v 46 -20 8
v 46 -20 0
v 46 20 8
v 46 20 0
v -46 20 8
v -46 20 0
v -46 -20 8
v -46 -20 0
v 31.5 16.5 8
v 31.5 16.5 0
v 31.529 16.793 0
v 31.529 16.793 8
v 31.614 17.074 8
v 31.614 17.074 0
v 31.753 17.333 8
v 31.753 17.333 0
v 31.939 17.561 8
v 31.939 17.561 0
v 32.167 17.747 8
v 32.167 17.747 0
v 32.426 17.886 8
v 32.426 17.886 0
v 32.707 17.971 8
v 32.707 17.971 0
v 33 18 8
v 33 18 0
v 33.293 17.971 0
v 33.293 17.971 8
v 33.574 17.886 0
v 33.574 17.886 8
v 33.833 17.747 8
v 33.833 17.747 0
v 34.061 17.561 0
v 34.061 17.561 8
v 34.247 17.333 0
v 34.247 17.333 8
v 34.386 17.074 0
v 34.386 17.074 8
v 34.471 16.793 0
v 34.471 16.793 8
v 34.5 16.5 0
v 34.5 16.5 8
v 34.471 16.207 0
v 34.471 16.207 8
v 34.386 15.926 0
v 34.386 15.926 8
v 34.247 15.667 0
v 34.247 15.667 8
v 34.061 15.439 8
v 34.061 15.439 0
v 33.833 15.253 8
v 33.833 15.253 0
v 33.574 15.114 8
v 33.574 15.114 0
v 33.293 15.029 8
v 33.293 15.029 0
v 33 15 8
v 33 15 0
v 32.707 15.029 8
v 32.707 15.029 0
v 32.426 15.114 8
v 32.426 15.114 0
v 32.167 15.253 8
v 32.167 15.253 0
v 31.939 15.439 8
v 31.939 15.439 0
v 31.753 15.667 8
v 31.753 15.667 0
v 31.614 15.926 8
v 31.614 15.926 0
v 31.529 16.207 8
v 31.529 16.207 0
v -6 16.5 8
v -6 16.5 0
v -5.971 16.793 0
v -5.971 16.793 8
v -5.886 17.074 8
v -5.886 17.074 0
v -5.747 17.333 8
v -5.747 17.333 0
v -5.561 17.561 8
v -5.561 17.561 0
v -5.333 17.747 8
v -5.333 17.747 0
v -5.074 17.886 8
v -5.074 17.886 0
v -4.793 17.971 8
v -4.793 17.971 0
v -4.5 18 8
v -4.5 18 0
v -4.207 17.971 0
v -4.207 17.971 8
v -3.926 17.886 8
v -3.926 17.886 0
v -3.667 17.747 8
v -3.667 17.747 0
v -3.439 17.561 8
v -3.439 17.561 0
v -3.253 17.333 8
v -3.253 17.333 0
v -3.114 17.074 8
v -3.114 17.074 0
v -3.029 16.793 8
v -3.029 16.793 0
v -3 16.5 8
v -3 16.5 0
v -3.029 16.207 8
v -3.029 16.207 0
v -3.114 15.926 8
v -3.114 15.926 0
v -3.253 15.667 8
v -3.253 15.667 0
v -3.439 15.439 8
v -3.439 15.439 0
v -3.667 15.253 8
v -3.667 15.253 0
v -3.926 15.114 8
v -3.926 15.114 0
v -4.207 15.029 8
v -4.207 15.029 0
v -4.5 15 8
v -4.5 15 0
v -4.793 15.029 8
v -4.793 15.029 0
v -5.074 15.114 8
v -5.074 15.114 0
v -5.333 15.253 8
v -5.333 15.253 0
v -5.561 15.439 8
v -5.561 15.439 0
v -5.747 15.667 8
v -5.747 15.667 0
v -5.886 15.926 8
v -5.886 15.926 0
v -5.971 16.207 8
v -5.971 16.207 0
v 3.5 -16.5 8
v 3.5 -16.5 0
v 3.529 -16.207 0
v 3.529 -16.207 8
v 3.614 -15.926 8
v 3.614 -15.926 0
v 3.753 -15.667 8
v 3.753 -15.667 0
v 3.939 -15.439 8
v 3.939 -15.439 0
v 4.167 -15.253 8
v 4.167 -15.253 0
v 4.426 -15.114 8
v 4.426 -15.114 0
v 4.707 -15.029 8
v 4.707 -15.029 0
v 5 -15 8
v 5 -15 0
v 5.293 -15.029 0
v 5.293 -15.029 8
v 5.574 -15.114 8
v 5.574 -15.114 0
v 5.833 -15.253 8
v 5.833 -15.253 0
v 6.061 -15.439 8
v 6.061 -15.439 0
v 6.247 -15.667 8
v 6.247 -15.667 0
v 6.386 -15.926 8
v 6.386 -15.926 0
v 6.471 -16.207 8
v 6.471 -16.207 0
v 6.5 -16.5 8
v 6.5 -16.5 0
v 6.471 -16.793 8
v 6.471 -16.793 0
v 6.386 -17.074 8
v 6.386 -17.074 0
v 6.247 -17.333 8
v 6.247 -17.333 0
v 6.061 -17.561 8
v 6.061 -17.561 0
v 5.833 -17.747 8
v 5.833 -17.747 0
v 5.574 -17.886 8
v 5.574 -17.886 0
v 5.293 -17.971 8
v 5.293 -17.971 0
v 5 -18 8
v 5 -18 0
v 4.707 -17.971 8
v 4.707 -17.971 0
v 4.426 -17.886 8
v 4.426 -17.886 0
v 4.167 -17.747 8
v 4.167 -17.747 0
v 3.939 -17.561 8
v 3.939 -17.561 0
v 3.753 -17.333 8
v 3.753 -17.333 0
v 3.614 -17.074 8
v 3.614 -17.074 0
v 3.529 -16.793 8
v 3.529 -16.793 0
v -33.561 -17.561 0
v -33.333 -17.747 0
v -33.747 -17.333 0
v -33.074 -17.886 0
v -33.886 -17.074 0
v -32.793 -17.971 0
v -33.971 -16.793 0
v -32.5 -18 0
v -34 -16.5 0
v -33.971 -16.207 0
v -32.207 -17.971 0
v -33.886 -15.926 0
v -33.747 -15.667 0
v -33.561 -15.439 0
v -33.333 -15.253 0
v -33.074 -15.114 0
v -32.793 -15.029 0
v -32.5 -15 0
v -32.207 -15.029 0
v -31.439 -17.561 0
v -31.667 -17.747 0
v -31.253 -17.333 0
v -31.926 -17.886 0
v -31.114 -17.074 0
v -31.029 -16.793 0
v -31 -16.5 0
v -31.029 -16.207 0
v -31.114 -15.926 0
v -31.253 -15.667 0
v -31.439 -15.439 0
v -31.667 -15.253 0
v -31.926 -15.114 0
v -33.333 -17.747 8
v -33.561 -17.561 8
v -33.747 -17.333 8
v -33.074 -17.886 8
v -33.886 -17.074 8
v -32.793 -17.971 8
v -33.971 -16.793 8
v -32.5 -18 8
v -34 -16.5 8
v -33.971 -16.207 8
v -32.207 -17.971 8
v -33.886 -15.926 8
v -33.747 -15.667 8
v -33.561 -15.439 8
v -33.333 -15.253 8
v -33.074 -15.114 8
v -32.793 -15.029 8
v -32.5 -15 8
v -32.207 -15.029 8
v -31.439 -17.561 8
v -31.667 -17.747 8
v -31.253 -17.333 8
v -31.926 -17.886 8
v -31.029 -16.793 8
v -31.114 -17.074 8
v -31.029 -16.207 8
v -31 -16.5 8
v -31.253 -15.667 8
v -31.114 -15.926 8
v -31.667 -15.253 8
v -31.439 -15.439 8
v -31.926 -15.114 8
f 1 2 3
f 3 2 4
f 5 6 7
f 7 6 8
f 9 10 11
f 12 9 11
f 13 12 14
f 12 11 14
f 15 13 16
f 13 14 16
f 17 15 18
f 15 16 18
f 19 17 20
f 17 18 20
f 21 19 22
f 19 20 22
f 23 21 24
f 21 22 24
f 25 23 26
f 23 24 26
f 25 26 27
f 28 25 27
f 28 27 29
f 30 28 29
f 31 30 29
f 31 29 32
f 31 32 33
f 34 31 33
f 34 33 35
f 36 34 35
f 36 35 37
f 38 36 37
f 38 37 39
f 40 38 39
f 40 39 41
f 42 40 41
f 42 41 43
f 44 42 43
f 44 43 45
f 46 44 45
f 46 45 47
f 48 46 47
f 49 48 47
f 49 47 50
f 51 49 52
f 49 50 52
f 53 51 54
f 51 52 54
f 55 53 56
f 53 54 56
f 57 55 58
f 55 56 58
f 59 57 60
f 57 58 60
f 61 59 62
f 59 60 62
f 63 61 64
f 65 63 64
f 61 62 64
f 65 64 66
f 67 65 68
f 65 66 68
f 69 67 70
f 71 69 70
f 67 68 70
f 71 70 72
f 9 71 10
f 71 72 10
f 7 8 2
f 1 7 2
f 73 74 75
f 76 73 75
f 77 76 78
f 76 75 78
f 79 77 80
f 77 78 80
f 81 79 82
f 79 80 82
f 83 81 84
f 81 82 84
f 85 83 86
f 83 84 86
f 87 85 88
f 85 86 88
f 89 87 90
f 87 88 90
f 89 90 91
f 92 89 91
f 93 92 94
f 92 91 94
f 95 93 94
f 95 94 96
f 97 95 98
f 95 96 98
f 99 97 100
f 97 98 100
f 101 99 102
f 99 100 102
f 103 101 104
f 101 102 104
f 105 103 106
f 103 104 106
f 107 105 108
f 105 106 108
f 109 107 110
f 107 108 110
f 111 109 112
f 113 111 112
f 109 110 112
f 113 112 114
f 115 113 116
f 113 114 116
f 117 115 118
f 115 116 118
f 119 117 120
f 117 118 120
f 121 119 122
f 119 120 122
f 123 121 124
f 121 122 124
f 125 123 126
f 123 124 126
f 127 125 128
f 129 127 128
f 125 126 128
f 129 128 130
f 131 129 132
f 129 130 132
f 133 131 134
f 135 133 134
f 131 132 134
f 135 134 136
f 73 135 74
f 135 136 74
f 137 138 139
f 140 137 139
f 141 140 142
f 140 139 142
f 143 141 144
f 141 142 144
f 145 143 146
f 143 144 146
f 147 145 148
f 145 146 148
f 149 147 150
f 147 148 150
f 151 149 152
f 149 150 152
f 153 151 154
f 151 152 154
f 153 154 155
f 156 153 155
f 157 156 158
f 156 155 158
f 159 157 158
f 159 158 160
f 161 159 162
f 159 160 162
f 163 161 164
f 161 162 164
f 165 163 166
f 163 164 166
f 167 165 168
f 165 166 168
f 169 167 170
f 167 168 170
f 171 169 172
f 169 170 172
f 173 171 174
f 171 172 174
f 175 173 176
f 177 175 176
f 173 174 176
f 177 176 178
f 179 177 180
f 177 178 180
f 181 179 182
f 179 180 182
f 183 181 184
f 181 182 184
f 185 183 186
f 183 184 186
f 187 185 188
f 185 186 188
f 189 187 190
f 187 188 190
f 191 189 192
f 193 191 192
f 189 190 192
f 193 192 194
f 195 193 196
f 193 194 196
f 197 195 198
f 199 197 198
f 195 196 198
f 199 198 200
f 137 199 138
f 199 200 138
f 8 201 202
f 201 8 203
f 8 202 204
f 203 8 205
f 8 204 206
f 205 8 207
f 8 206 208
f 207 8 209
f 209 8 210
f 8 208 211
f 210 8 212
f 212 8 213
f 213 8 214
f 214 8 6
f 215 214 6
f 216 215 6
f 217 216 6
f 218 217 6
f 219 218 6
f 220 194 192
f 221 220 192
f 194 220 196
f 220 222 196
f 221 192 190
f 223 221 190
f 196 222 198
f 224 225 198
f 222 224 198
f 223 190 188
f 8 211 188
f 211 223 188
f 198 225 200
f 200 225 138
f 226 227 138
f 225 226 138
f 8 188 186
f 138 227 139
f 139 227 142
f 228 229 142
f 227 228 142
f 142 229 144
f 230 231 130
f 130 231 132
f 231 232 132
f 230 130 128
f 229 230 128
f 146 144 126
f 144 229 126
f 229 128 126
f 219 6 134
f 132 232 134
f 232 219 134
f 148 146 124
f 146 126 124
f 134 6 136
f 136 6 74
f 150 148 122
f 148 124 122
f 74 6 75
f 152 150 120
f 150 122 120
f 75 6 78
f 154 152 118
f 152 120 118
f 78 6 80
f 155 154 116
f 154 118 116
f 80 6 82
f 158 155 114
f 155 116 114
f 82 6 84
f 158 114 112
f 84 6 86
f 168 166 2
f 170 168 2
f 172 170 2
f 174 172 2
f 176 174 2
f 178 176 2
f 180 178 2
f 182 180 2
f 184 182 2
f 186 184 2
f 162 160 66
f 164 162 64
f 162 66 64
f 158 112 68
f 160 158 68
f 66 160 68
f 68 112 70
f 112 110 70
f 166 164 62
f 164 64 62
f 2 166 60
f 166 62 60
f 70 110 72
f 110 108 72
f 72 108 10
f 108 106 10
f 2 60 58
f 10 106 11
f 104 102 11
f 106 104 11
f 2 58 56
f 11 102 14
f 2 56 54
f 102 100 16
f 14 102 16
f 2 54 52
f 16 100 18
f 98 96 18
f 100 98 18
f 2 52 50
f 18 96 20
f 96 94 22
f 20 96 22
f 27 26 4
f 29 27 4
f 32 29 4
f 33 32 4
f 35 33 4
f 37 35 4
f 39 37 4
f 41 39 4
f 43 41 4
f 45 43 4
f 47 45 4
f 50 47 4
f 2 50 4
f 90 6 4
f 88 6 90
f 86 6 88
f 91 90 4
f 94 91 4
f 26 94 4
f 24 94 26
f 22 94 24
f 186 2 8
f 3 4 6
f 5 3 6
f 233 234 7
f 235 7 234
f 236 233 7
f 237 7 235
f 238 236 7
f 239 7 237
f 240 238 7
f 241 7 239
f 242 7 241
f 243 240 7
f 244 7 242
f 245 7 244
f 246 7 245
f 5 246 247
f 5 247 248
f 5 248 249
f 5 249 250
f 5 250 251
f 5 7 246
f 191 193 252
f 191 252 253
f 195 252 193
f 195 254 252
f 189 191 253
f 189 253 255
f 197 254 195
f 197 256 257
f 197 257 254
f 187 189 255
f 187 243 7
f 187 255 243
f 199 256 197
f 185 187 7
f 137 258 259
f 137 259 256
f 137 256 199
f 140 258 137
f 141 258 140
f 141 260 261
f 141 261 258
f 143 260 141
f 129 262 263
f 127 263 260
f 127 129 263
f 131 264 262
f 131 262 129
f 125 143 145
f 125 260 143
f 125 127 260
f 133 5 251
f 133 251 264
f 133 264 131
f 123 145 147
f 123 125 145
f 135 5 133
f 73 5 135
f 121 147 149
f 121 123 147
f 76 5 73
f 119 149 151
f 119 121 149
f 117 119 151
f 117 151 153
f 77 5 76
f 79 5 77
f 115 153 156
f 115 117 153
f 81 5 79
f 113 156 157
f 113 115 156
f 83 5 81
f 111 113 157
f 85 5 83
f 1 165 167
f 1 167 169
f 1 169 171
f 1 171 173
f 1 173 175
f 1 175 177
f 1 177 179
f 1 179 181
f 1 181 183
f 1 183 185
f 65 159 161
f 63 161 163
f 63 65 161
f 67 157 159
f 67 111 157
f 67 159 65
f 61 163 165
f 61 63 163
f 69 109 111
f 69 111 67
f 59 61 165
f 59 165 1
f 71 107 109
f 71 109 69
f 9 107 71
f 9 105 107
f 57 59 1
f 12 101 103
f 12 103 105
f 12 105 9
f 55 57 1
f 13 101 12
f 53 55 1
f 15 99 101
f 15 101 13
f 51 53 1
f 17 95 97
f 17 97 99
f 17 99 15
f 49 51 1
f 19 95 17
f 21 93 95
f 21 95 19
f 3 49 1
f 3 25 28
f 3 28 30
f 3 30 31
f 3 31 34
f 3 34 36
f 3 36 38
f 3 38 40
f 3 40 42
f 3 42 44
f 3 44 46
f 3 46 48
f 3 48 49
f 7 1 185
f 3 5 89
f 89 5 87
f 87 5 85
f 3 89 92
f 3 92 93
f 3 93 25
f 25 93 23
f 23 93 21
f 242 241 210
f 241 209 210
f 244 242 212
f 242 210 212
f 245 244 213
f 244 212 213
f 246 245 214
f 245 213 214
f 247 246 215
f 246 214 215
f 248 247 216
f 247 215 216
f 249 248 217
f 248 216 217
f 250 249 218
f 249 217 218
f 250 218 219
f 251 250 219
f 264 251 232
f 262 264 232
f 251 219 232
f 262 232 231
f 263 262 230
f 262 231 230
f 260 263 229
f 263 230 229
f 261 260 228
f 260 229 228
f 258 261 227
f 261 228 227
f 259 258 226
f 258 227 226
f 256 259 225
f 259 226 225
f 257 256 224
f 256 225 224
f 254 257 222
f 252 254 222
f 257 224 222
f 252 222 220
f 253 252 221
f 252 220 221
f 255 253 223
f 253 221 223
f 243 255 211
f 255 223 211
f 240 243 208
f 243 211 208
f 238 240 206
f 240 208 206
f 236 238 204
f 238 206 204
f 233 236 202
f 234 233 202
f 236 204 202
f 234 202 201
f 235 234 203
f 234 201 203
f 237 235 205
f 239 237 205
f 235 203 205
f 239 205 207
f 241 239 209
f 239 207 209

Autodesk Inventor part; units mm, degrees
ref_plane "YZ Plane" through (0, 0, 0) normal (1, 0, 0) x (0, 1, 0)
ref_plane "XZ Plane" through (0, 0, 0) normal (0, 1, 0) x (-1, 0, 0)
ref_plane "XY Plane" through (0, 0, 0) normal (0, 0, 1) x (1, 0, 0)
sketch "Sketch1" plane through (0, 0, 0) normal (0, 0, 1) x (1, 0, 0)
  line L0 (0, 0) -> (46, 0)
  line L1 (46, 0) -> (46, 20)
  line L2 (46, 20) -> (0, 20)
  line L3 (0, 20) -> (0, 0)
  line L4 (0, 0) -> (-46, 0)
  line L5 (-46, 0) -> (-46, -20)
  line L6 (-46, -20) -> (0, -20)
  line L7 (0, -20) -> (0, 0)
  line L8 (-46, -20) -> (46, -20)
  line L9 (46, -20) -> (46, 20)
  line L10 (46, 20) -> (-46, 20)
  line L11 (-46, 20) -> (-46, -20)
  point P0 (0, 20)
  point P1 (0, -20)
  dimension "d7" = 40
  dimension "d8" = 92
extrude "Extrusion1" add sketch "Sketch1" along normal blind 8
sketch "Sketch2" plane through (0, 0, 0) normal (0, 0, -1) x (-1, 0, 0)
  circle A0 centre (24, 16) radius 1.25 construction
  circle A1 centre (-33, 16.5) radius 1.5
  circle A2 centre (-14, 16) radius 1.25 construction
  circle A3 centre (14, 16) radius 1.25 construction
  circle A4 centre (4.5, 16.5) radius 1.5
  circle A5 centre (-5, -16.5) radius 1.5
  circle A6 centre (32.5, -16.5) radius 1.5
  point P0 (0, 0)
extrude "Extrusion2" cut sketch "Sketch2" against normal through all
properties part number "Bottom"
